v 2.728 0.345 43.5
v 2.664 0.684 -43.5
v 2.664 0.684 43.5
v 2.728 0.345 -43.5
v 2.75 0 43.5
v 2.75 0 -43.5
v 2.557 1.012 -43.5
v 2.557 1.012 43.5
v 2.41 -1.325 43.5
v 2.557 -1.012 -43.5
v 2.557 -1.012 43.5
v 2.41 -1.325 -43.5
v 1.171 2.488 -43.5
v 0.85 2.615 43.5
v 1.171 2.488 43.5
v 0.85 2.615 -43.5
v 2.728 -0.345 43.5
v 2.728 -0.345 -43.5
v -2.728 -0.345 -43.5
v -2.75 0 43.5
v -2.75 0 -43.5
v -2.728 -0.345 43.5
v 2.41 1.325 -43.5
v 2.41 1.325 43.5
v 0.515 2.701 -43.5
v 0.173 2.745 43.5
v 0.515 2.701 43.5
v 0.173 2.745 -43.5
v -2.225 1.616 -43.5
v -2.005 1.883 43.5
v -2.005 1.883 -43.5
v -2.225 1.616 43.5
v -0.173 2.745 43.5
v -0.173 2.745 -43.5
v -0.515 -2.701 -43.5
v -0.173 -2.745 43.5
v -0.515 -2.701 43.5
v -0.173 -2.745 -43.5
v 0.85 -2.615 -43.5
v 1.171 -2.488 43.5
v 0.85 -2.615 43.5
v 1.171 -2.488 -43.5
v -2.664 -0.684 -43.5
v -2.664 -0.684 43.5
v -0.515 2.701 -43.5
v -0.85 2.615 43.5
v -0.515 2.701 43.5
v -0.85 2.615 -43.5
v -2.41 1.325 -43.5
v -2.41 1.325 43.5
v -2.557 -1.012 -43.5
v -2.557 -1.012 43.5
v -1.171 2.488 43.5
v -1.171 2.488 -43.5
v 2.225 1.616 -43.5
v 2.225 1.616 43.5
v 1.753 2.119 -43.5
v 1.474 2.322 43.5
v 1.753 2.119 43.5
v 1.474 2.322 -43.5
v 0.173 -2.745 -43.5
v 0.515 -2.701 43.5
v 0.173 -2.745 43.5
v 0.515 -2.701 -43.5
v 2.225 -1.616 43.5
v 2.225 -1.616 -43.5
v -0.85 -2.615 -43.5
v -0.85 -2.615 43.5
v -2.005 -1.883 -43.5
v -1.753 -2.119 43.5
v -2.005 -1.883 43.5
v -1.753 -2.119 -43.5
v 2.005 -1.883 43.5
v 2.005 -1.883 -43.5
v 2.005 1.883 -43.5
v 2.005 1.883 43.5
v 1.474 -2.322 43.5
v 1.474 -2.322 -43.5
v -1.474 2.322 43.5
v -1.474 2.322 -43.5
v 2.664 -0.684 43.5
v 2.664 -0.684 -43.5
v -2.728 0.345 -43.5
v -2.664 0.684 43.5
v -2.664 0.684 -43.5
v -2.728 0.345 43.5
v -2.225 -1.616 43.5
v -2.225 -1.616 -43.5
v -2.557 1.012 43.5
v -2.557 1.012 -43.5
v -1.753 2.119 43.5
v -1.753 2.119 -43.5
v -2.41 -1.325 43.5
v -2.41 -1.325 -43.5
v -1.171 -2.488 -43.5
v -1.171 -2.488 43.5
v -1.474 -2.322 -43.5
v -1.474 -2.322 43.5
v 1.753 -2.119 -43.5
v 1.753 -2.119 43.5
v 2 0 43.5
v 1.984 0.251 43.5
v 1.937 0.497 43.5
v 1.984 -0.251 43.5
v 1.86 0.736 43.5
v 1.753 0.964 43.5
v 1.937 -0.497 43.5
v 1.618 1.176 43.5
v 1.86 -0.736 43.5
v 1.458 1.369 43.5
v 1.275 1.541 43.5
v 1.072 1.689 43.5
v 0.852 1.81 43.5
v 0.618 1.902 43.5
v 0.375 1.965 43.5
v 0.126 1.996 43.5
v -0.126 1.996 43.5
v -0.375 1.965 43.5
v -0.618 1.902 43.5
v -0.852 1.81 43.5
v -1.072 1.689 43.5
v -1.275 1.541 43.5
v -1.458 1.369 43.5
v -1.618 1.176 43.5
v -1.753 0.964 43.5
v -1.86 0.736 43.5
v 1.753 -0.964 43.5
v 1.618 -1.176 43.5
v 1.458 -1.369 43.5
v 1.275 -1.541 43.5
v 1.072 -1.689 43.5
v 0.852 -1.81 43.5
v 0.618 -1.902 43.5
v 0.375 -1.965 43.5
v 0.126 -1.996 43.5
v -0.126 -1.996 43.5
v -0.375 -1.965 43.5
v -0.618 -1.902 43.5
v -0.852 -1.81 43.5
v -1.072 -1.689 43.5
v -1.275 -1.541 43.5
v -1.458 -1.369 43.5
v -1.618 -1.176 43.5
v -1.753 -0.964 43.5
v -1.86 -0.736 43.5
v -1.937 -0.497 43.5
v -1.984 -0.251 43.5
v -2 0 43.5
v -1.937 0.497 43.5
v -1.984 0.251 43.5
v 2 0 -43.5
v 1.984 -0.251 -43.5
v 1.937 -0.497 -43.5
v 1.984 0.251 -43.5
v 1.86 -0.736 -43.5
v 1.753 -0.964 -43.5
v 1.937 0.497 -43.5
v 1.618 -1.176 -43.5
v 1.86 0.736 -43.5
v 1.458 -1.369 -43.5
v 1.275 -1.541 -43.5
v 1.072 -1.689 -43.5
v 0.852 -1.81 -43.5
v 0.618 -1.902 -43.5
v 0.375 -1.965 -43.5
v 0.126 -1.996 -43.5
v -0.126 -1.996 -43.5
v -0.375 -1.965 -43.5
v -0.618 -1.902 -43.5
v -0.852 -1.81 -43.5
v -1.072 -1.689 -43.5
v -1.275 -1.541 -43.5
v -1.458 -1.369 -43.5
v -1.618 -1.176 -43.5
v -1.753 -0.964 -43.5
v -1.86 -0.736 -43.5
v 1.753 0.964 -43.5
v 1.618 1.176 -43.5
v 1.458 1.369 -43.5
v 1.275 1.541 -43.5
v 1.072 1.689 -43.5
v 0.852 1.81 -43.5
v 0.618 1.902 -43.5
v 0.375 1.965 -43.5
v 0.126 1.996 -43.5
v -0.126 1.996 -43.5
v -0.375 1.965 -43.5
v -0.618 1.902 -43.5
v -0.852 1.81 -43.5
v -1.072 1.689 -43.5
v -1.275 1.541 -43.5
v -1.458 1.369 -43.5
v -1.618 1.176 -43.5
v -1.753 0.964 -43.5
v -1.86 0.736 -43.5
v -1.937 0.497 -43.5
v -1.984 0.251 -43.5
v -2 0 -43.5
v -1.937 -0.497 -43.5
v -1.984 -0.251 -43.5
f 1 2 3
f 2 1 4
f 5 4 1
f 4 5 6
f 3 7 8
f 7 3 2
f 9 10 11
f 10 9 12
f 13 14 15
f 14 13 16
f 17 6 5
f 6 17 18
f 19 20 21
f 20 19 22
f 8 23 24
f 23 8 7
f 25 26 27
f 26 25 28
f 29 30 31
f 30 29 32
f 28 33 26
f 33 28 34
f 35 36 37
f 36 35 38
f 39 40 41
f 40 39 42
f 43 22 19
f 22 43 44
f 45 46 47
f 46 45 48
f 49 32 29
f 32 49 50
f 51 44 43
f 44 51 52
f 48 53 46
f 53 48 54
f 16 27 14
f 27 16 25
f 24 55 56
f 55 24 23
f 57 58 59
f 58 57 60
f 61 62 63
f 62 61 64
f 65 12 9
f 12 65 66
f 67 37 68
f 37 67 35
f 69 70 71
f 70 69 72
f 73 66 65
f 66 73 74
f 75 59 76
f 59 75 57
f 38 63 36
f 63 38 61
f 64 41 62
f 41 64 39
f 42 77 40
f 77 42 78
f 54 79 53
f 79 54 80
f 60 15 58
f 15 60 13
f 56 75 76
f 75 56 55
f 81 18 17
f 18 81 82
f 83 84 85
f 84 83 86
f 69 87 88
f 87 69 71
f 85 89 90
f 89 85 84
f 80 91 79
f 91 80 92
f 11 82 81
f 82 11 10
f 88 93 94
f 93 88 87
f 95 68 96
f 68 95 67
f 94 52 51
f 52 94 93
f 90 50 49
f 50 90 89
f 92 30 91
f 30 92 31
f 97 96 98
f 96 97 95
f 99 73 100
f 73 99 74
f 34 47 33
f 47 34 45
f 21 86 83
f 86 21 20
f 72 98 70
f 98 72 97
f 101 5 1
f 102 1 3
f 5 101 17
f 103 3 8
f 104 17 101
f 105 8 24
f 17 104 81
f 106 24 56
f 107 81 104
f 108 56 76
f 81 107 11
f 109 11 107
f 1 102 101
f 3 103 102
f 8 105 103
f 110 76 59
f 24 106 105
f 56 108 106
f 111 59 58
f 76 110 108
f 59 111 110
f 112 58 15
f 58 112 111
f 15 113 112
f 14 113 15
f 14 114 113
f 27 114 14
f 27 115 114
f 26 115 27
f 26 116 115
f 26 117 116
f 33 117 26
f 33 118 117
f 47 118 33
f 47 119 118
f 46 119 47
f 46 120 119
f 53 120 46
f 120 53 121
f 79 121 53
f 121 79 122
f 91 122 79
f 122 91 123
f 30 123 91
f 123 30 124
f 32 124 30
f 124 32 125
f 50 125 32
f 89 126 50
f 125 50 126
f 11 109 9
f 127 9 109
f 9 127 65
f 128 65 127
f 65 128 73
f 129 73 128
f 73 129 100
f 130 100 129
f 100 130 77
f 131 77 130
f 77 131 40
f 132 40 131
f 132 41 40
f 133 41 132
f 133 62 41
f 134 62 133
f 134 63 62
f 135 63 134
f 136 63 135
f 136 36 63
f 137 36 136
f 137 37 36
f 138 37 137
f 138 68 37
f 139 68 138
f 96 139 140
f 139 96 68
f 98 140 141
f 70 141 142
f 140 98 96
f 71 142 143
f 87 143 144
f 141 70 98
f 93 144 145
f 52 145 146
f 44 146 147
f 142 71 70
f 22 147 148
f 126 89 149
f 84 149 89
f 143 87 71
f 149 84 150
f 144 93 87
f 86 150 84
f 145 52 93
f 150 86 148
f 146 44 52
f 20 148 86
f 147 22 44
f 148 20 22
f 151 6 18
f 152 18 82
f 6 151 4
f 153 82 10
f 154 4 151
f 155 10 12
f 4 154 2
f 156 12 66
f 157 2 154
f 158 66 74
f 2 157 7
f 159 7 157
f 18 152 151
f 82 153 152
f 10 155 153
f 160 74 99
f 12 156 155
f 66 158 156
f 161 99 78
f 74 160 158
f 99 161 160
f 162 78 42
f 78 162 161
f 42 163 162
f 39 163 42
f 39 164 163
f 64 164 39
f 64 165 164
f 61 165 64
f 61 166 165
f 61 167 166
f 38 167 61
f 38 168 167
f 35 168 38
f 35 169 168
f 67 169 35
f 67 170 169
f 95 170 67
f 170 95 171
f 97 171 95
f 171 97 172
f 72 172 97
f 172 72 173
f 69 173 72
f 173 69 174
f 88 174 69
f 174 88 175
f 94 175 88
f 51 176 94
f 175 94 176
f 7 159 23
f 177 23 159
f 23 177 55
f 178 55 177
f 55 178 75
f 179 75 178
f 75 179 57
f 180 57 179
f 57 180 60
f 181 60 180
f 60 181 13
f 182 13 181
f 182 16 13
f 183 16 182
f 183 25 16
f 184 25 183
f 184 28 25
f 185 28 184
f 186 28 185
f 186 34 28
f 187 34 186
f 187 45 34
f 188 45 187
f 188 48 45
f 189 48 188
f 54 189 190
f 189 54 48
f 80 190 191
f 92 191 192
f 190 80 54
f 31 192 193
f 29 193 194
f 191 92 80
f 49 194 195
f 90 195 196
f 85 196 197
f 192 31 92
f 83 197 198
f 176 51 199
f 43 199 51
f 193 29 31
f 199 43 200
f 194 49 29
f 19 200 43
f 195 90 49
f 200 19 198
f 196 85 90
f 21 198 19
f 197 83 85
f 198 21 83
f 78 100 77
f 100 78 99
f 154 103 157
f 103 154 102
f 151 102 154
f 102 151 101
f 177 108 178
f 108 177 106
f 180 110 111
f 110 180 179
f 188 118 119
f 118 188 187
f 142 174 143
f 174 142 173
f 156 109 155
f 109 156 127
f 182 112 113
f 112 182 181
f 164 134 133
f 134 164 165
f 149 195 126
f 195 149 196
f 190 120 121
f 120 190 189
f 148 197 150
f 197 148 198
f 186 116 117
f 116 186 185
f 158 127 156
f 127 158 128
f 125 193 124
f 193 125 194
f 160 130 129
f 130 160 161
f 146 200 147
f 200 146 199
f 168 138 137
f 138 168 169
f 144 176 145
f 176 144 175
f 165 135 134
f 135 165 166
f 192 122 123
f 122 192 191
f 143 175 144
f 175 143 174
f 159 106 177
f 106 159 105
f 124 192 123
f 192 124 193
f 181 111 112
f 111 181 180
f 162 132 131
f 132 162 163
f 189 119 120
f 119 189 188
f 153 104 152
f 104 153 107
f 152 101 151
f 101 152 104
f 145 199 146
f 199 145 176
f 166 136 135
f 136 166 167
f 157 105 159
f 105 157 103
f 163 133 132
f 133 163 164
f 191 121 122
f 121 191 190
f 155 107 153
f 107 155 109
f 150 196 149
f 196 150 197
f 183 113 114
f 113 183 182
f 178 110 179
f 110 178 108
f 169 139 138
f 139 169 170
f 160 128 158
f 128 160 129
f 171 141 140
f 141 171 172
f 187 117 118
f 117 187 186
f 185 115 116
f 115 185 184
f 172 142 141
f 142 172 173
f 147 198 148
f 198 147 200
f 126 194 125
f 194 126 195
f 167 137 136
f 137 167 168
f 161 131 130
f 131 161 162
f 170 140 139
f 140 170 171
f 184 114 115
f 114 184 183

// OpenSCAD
$fn = 50;


difference() {
	union() {
		translate(v = [0, 0, -43.5000000000]) {
			cylinder(h = 87, r = 2.7500000000);
		}
	}
	union() {
		translate(v = [0, 0, -100.0000000000]) {
			cylinder(h = 200, r = 2.0000000000);
		}
	}
}
